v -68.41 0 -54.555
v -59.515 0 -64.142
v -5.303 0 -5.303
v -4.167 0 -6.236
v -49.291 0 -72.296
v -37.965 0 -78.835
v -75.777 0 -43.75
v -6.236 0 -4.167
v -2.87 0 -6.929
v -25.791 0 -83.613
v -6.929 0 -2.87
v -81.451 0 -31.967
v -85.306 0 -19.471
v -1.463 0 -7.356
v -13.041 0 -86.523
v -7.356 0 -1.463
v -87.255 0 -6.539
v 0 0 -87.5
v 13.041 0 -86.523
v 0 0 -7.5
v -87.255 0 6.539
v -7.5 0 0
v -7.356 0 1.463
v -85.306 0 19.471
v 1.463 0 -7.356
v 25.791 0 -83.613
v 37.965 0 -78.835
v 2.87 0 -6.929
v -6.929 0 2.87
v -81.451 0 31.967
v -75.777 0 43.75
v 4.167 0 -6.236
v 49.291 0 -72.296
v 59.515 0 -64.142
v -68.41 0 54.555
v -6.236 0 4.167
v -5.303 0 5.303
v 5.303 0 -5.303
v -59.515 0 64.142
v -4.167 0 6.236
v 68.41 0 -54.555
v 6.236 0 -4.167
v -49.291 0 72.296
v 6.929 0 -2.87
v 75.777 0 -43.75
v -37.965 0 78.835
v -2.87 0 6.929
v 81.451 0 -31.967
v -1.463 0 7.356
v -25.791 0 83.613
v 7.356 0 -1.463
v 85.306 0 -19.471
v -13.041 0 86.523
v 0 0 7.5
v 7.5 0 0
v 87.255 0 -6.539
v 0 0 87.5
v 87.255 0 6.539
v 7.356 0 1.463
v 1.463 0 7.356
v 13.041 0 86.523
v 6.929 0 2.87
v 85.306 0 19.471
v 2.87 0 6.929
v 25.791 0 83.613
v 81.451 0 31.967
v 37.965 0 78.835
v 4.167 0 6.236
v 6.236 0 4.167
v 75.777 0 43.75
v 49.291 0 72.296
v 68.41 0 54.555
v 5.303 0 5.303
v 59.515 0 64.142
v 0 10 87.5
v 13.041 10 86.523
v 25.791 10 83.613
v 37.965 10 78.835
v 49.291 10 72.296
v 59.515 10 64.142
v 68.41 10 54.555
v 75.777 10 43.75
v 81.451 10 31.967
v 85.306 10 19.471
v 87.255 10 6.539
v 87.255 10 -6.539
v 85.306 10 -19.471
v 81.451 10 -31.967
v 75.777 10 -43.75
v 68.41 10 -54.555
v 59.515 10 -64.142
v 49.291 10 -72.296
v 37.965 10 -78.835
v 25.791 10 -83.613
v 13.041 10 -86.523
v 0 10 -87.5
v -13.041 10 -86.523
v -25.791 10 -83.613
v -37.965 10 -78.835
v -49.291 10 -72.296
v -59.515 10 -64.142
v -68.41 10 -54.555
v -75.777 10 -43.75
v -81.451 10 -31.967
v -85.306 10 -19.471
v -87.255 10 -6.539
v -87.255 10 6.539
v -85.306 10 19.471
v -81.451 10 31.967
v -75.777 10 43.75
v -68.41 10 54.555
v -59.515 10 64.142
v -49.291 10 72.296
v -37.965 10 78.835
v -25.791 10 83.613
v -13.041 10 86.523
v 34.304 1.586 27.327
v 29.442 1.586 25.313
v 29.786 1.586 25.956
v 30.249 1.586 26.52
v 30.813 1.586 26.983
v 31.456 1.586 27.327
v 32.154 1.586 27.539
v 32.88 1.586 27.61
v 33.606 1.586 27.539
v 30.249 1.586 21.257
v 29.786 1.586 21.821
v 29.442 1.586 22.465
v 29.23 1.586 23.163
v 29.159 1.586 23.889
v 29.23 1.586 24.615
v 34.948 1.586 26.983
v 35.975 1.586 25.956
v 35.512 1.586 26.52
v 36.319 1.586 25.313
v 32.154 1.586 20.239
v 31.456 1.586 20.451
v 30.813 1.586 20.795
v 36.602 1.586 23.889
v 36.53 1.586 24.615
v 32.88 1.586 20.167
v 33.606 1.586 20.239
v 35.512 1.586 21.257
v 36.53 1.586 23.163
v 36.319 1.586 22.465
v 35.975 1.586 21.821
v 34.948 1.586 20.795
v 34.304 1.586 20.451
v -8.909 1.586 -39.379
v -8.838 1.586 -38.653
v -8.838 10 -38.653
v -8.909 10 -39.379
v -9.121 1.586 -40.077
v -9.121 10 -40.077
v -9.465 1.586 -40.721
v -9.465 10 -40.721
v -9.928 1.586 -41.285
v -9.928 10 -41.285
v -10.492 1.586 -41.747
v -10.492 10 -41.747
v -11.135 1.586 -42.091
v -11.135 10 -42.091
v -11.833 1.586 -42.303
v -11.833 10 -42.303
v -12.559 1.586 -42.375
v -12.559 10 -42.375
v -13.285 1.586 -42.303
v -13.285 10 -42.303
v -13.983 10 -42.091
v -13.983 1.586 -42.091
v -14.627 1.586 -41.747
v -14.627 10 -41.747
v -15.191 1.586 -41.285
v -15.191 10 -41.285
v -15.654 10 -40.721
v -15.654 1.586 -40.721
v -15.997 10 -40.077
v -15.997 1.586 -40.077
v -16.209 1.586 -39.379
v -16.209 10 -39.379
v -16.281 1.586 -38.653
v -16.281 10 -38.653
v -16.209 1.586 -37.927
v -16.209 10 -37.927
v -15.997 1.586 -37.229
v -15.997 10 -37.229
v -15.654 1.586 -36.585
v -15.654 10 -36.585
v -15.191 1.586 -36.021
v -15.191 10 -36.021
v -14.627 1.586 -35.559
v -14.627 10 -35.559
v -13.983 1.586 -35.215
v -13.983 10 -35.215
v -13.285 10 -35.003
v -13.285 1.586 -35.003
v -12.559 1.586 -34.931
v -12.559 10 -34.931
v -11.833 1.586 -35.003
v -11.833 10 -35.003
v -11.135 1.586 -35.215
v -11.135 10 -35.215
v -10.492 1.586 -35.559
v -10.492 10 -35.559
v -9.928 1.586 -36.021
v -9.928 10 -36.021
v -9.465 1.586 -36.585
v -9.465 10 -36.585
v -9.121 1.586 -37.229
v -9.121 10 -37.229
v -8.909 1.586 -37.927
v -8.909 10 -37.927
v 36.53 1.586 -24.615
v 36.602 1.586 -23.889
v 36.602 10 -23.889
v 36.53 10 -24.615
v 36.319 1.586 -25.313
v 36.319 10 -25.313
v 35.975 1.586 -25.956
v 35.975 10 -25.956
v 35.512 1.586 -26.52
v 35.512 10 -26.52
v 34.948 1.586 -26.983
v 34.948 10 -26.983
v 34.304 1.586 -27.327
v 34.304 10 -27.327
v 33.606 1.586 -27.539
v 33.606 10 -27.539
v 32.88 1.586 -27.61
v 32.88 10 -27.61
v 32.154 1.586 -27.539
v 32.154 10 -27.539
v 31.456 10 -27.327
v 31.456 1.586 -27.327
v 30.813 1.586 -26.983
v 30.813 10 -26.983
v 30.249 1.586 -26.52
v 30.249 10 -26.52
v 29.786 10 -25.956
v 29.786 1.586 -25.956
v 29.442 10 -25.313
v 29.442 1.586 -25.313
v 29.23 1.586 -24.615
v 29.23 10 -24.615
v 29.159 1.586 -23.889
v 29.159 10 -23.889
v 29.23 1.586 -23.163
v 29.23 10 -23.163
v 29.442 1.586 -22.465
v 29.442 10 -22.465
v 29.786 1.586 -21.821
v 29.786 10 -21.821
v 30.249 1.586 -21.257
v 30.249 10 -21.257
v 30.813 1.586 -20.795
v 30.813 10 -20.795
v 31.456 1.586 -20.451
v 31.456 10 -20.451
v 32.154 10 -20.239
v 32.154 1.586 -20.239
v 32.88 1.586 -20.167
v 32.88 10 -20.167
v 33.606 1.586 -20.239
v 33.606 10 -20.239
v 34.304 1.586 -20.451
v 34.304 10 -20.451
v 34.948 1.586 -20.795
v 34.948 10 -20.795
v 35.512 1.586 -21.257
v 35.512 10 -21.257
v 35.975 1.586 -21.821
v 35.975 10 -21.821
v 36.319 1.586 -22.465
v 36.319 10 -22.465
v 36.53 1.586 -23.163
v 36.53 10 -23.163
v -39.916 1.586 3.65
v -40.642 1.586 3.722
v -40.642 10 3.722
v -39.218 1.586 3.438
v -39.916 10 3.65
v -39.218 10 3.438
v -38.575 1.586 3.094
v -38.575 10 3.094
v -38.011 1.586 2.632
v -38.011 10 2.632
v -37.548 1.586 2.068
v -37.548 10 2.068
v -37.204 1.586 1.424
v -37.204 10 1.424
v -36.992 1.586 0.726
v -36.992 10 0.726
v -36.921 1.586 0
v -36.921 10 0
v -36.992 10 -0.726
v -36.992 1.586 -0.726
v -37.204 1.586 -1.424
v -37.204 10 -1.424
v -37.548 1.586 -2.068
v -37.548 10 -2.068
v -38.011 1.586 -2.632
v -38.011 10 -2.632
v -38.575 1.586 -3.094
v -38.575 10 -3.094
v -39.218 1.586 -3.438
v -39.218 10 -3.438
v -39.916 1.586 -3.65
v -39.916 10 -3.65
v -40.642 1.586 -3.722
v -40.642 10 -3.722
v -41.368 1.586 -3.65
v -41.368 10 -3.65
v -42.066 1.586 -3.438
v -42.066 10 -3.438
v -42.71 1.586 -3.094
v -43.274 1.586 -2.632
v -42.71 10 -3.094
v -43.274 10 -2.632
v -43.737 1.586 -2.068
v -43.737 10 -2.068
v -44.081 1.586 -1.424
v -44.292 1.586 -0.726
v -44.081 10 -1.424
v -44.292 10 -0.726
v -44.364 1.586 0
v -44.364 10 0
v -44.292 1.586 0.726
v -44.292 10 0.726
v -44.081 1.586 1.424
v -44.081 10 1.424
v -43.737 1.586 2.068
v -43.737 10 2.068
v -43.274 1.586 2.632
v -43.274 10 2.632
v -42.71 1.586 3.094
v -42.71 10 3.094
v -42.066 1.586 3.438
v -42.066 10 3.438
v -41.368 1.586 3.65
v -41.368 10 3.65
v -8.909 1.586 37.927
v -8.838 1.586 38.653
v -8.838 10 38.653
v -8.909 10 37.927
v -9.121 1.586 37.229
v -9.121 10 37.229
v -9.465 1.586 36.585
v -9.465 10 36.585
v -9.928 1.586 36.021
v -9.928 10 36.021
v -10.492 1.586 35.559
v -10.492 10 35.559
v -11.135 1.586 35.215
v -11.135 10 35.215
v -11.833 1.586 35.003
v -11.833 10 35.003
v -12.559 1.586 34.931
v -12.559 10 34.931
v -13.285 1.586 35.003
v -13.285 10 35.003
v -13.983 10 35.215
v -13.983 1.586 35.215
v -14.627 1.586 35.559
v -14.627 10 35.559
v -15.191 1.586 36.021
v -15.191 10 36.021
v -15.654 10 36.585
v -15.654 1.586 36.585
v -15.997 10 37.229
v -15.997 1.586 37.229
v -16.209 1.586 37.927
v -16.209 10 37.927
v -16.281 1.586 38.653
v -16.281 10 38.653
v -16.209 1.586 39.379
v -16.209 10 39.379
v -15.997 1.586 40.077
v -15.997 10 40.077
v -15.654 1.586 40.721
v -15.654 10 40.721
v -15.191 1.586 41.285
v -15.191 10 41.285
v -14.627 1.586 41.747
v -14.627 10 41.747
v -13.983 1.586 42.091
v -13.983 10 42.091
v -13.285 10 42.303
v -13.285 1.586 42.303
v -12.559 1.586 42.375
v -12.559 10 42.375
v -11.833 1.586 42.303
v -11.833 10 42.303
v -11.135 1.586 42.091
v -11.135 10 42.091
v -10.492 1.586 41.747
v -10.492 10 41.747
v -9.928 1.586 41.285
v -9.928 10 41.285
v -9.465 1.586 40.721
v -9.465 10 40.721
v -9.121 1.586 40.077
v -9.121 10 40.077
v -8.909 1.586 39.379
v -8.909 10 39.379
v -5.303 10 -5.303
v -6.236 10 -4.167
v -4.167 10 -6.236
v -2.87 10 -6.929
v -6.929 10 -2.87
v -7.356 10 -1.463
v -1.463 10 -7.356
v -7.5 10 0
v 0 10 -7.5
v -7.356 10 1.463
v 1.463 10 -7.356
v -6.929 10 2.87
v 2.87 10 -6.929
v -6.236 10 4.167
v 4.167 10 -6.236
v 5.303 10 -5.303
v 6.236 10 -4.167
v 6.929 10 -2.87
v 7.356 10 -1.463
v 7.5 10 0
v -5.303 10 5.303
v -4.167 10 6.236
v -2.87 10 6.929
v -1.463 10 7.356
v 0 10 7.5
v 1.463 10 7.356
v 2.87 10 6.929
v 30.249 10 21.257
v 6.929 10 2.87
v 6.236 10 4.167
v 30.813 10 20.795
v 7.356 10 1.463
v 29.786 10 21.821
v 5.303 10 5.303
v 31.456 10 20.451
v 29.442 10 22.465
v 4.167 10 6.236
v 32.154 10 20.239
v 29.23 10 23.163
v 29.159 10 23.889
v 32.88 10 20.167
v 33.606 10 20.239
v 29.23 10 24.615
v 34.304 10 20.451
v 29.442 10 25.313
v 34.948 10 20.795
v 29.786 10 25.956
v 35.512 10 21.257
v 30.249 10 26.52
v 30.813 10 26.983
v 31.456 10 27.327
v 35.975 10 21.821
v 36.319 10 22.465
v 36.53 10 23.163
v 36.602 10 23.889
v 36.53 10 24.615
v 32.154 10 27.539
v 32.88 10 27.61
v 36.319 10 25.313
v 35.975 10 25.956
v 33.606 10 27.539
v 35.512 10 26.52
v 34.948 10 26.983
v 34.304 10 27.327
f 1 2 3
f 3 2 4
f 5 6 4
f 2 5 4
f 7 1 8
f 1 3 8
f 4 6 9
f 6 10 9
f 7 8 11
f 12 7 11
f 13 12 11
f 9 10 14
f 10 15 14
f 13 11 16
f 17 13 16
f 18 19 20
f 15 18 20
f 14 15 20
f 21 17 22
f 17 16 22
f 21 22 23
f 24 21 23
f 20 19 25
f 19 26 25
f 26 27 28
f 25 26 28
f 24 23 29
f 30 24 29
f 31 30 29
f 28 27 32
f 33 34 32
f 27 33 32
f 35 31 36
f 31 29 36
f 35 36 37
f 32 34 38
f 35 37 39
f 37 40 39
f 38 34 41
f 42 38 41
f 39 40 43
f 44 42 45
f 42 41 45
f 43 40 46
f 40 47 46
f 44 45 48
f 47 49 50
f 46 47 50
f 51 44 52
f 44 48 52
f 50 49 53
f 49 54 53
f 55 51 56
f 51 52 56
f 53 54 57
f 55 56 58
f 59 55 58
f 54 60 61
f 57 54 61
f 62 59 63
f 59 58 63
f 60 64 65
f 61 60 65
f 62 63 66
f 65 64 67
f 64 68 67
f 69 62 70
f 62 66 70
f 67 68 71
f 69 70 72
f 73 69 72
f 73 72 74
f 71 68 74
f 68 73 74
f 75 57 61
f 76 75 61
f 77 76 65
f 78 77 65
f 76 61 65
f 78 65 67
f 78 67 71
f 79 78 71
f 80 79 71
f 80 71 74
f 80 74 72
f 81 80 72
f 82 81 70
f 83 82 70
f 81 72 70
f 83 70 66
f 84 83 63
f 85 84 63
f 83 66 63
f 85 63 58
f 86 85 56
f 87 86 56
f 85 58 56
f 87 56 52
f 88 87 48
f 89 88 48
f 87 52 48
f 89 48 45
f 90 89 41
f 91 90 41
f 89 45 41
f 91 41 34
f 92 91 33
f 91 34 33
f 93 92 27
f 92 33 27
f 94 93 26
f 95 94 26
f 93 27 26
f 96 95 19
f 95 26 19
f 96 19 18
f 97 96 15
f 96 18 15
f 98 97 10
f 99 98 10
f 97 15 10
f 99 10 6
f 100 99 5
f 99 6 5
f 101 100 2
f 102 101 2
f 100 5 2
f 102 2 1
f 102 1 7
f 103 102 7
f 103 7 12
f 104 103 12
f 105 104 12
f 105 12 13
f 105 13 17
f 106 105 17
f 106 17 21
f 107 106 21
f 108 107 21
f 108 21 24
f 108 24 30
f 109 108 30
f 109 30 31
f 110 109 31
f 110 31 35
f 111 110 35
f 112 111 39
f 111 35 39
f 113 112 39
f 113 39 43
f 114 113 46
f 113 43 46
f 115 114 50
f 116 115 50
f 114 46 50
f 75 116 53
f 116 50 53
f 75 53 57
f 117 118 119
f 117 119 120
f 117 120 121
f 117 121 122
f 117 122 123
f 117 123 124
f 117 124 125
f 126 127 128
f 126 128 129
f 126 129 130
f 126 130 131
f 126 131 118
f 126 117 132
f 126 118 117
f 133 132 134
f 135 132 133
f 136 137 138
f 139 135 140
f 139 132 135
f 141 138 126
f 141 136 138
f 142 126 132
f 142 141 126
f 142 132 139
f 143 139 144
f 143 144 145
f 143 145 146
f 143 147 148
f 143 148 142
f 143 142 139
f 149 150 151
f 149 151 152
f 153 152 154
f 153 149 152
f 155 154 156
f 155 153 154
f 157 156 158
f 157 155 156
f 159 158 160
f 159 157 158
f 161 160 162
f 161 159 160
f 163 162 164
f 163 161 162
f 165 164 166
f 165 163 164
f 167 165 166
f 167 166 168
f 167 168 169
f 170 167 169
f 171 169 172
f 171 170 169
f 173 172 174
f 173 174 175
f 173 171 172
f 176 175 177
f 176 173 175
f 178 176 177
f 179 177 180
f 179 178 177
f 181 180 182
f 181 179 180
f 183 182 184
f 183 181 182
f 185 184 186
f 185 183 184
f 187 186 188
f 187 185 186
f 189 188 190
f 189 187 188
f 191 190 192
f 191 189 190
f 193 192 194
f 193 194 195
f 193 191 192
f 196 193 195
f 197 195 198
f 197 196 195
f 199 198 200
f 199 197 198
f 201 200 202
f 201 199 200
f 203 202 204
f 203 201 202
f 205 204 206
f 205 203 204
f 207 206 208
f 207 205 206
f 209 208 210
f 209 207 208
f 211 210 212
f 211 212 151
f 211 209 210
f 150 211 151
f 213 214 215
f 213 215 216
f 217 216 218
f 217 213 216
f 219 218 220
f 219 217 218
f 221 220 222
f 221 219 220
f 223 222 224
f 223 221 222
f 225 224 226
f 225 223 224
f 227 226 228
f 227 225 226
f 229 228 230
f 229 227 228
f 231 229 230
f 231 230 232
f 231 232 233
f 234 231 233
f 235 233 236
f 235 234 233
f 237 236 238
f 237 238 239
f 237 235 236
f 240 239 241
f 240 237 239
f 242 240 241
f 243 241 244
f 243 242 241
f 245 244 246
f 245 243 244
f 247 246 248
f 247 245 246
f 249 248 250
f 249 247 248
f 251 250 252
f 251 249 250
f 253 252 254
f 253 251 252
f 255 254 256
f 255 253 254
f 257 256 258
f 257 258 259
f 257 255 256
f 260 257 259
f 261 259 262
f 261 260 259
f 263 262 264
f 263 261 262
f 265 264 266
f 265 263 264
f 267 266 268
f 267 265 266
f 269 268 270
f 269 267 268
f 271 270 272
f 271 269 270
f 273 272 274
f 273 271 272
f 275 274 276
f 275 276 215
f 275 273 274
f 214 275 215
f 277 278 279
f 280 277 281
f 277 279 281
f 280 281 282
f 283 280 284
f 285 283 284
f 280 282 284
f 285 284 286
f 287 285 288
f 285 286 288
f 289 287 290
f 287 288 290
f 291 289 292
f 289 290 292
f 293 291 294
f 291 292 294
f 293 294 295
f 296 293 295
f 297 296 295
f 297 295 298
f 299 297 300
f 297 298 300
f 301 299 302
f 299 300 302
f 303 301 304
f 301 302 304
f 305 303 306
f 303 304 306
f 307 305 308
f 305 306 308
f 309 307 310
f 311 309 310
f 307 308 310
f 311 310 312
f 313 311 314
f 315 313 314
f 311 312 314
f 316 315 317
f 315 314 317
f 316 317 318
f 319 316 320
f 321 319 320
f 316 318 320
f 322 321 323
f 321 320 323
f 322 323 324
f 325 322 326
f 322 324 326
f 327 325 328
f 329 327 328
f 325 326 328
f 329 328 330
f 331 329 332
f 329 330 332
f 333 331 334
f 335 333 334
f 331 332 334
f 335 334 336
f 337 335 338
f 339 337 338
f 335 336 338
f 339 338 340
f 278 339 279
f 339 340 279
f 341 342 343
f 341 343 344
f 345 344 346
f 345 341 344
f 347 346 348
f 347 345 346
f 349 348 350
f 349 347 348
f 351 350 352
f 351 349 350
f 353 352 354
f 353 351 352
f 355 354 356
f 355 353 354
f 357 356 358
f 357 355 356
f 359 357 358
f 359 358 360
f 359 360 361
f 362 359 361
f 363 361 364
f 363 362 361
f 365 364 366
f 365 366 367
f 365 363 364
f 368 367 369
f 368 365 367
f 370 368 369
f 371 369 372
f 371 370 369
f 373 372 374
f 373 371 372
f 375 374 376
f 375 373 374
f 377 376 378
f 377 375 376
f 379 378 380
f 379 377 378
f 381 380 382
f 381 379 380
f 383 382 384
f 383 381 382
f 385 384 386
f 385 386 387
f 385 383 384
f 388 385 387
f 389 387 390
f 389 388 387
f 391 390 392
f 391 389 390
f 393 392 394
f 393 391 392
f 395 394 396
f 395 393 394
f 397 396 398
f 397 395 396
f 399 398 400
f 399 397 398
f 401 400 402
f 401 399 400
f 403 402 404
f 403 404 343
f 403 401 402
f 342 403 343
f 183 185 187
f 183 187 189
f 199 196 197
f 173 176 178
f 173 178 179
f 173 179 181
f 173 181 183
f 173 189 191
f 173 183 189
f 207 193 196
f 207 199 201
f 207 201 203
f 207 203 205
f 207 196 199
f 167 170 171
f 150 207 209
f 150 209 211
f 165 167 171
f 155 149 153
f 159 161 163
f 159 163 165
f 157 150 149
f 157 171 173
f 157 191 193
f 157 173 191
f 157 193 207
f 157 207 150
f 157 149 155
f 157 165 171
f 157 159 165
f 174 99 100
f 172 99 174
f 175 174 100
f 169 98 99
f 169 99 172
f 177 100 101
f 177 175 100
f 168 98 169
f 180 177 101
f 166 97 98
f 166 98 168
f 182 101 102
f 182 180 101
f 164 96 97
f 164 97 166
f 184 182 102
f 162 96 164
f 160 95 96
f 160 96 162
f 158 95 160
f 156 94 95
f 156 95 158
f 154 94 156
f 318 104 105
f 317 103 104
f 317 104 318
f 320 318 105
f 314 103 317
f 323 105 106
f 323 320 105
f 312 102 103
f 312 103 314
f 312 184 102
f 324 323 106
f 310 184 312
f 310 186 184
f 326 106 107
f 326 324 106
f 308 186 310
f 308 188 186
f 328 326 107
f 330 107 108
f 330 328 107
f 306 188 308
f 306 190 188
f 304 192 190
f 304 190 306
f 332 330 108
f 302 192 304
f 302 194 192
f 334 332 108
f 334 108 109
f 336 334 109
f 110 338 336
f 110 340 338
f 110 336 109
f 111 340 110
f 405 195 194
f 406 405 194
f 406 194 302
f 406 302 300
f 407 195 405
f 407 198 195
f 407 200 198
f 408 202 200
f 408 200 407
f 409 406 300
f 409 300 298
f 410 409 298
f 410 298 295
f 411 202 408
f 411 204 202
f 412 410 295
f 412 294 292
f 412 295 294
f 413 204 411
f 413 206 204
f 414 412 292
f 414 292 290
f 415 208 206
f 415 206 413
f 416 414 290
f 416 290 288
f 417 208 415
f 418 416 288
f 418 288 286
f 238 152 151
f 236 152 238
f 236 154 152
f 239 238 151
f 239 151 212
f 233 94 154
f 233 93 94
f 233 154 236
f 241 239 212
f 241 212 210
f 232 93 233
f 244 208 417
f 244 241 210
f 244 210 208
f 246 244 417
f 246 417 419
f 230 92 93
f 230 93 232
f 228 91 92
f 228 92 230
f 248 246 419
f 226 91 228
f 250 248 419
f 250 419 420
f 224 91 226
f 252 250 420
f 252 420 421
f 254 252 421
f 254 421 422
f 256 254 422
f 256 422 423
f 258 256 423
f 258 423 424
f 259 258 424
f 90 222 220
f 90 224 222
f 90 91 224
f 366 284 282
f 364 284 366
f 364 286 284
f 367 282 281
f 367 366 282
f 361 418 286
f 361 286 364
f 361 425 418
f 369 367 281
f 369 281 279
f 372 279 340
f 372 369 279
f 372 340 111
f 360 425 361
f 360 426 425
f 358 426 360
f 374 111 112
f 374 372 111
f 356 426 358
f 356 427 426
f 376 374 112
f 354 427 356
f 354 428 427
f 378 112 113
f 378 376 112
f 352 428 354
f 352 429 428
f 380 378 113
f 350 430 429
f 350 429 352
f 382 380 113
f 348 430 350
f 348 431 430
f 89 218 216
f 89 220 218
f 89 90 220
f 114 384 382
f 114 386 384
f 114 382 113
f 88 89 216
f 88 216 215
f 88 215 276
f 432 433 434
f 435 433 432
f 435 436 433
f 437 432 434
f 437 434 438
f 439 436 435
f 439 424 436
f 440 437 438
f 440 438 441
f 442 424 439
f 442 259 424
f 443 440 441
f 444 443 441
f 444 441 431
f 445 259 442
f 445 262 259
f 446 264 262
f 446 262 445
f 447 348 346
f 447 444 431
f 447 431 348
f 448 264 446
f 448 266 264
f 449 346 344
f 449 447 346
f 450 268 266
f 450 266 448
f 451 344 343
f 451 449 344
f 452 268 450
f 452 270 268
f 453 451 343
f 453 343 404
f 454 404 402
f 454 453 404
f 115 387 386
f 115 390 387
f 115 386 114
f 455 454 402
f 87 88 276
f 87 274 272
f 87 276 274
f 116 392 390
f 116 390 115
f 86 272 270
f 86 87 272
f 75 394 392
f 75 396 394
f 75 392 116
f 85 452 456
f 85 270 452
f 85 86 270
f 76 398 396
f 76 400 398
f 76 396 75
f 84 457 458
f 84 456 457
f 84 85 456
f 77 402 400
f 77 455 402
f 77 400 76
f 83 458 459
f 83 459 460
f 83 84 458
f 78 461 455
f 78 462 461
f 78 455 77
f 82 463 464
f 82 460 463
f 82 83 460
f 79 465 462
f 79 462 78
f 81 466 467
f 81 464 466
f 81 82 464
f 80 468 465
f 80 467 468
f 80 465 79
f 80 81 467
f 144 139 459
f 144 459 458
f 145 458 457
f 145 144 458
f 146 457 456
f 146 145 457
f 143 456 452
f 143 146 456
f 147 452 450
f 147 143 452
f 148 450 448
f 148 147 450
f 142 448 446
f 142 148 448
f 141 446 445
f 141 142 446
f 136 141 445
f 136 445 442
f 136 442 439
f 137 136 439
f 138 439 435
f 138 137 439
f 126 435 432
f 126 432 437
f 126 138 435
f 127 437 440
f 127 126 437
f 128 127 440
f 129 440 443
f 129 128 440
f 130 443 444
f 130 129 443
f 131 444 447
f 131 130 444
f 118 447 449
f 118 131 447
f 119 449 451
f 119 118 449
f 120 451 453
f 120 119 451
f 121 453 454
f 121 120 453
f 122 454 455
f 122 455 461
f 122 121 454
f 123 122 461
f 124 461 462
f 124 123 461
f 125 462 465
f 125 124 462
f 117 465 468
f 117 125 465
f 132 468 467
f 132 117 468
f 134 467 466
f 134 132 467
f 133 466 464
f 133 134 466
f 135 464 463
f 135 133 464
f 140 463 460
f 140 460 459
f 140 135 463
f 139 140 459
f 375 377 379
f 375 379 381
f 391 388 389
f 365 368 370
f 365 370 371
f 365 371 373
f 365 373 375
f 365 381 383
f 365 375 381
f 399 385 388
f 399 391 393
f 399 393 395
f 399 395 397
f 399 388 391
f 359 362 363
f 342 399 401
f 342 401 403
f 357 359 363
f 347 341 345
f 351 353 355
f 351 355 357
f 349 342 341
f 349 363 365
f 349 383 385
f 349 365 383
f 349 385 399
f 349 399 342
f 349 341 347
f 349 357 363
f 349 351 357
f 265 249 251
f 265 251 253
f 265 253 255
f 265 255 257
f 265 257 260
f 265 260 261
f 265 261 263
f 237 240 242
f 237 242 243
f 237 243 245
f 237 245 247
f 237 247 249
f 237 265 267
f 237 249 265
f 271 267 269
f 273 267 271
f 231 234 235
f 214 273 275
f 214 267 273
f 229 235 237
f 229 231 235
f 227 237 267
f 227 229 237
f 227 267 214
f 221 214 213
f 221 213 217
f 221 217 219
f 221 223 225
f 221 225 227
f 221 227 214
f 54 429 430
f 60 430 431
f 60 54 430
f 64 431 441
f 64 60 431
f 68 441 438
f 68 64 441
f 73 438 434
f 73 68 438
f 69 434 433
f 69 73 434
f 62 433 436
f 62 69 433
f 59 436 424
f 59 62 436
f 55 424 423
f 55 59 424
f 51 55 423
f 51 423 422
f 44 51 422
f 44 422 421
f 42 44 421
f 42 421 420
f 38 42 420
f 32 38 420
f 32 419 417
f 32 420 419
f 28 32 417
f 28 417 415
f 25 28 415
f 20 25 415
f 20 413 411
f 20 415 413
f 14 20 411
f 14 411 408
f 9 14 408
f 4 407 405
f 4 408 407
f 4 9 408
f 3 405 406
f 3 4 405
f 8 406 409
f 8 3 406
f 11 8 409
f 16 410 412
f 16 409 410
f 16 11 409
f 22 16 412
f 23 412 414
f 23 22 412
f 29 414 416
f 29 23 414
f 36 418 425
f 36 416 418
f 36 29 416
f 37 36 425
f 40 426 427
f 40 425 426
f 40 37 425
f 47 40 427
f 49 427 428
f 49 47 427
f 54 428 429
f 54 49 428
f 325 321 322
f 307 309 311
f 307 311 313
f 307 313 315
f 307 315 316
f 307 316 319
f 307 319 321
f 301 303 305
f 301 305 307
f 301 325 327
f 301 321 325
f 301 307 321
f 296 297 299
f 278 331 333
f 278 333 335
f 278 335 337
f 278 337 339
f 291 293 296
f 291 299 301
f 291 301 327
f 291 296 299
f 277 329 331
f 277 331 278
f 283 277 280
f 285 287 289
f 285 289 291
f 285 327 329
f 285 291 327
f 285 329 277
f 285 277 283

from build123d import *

# Parameters (mm, degrees)
SKETCH1_R           = 87.5
BOSS_EXTRUDE1_DEPTH = 10
SKETCH2_R           = 7.5
CUT_EXTRUDE1_DEPTH  = 125.147090179
SKETCH3_R           = 3.721577815
CUT_EXTRUDE2_DEPTH  = 8.414033674
CIRPATTERN1_COUNT   = 5


with BuildPart() as part:
    # Sketch1 → Boss-Extrude1 (new body)
    with BuildSketch(Plane(origin=(0, 0, 0), x_dir=(1, 0, 0), z_dir=(0, 1, 0))):
        Circle(SKETCH1_R)
    extrude(amount=BOSS_EXTRUDE1_DEPTH)

    # Sketch2 → Cut-Extrude1 (cut, through all)
    with BuildSketch(Plane(origin=(0, 0, 0), x_dir=(1, 0, 0), z_dir=(0, 1, 0))):
        Circle(SKETCH2_R)
    extrude(amount=CUT_EXTRUDE1_DEPTH, mode=Mode.SUBTRACT)

    # Sketch3 → Cut-Extrude2 (cut)
    with BuildSketch(Plane(origin=(0, 10, 0), x_dir=(1, 0, 0), z_dir=(0, 1, 0))):
        with Locations((-40.642213715, 0)):
            Circle(SKETCH3_R)
    cut_extrude2 = extrude(amount=-CUT_EXTRUDE2_DEPTH, mode=Mode.SUBTRACT)

    # CirPattern1: Cut-Extrude2 ×5 about axis
    cirpattern1_axis = Axis((0, 0, 0), (0, 1, 0))
    for i in range(1, CIRPATTERN1_COUNT):
        add(cut_extrude2.rotate(cirpattern1_axis, i * 360 / CIRPATTERN1_COUNT), mode=Mode.SUBTRACT)


solid = part.part
